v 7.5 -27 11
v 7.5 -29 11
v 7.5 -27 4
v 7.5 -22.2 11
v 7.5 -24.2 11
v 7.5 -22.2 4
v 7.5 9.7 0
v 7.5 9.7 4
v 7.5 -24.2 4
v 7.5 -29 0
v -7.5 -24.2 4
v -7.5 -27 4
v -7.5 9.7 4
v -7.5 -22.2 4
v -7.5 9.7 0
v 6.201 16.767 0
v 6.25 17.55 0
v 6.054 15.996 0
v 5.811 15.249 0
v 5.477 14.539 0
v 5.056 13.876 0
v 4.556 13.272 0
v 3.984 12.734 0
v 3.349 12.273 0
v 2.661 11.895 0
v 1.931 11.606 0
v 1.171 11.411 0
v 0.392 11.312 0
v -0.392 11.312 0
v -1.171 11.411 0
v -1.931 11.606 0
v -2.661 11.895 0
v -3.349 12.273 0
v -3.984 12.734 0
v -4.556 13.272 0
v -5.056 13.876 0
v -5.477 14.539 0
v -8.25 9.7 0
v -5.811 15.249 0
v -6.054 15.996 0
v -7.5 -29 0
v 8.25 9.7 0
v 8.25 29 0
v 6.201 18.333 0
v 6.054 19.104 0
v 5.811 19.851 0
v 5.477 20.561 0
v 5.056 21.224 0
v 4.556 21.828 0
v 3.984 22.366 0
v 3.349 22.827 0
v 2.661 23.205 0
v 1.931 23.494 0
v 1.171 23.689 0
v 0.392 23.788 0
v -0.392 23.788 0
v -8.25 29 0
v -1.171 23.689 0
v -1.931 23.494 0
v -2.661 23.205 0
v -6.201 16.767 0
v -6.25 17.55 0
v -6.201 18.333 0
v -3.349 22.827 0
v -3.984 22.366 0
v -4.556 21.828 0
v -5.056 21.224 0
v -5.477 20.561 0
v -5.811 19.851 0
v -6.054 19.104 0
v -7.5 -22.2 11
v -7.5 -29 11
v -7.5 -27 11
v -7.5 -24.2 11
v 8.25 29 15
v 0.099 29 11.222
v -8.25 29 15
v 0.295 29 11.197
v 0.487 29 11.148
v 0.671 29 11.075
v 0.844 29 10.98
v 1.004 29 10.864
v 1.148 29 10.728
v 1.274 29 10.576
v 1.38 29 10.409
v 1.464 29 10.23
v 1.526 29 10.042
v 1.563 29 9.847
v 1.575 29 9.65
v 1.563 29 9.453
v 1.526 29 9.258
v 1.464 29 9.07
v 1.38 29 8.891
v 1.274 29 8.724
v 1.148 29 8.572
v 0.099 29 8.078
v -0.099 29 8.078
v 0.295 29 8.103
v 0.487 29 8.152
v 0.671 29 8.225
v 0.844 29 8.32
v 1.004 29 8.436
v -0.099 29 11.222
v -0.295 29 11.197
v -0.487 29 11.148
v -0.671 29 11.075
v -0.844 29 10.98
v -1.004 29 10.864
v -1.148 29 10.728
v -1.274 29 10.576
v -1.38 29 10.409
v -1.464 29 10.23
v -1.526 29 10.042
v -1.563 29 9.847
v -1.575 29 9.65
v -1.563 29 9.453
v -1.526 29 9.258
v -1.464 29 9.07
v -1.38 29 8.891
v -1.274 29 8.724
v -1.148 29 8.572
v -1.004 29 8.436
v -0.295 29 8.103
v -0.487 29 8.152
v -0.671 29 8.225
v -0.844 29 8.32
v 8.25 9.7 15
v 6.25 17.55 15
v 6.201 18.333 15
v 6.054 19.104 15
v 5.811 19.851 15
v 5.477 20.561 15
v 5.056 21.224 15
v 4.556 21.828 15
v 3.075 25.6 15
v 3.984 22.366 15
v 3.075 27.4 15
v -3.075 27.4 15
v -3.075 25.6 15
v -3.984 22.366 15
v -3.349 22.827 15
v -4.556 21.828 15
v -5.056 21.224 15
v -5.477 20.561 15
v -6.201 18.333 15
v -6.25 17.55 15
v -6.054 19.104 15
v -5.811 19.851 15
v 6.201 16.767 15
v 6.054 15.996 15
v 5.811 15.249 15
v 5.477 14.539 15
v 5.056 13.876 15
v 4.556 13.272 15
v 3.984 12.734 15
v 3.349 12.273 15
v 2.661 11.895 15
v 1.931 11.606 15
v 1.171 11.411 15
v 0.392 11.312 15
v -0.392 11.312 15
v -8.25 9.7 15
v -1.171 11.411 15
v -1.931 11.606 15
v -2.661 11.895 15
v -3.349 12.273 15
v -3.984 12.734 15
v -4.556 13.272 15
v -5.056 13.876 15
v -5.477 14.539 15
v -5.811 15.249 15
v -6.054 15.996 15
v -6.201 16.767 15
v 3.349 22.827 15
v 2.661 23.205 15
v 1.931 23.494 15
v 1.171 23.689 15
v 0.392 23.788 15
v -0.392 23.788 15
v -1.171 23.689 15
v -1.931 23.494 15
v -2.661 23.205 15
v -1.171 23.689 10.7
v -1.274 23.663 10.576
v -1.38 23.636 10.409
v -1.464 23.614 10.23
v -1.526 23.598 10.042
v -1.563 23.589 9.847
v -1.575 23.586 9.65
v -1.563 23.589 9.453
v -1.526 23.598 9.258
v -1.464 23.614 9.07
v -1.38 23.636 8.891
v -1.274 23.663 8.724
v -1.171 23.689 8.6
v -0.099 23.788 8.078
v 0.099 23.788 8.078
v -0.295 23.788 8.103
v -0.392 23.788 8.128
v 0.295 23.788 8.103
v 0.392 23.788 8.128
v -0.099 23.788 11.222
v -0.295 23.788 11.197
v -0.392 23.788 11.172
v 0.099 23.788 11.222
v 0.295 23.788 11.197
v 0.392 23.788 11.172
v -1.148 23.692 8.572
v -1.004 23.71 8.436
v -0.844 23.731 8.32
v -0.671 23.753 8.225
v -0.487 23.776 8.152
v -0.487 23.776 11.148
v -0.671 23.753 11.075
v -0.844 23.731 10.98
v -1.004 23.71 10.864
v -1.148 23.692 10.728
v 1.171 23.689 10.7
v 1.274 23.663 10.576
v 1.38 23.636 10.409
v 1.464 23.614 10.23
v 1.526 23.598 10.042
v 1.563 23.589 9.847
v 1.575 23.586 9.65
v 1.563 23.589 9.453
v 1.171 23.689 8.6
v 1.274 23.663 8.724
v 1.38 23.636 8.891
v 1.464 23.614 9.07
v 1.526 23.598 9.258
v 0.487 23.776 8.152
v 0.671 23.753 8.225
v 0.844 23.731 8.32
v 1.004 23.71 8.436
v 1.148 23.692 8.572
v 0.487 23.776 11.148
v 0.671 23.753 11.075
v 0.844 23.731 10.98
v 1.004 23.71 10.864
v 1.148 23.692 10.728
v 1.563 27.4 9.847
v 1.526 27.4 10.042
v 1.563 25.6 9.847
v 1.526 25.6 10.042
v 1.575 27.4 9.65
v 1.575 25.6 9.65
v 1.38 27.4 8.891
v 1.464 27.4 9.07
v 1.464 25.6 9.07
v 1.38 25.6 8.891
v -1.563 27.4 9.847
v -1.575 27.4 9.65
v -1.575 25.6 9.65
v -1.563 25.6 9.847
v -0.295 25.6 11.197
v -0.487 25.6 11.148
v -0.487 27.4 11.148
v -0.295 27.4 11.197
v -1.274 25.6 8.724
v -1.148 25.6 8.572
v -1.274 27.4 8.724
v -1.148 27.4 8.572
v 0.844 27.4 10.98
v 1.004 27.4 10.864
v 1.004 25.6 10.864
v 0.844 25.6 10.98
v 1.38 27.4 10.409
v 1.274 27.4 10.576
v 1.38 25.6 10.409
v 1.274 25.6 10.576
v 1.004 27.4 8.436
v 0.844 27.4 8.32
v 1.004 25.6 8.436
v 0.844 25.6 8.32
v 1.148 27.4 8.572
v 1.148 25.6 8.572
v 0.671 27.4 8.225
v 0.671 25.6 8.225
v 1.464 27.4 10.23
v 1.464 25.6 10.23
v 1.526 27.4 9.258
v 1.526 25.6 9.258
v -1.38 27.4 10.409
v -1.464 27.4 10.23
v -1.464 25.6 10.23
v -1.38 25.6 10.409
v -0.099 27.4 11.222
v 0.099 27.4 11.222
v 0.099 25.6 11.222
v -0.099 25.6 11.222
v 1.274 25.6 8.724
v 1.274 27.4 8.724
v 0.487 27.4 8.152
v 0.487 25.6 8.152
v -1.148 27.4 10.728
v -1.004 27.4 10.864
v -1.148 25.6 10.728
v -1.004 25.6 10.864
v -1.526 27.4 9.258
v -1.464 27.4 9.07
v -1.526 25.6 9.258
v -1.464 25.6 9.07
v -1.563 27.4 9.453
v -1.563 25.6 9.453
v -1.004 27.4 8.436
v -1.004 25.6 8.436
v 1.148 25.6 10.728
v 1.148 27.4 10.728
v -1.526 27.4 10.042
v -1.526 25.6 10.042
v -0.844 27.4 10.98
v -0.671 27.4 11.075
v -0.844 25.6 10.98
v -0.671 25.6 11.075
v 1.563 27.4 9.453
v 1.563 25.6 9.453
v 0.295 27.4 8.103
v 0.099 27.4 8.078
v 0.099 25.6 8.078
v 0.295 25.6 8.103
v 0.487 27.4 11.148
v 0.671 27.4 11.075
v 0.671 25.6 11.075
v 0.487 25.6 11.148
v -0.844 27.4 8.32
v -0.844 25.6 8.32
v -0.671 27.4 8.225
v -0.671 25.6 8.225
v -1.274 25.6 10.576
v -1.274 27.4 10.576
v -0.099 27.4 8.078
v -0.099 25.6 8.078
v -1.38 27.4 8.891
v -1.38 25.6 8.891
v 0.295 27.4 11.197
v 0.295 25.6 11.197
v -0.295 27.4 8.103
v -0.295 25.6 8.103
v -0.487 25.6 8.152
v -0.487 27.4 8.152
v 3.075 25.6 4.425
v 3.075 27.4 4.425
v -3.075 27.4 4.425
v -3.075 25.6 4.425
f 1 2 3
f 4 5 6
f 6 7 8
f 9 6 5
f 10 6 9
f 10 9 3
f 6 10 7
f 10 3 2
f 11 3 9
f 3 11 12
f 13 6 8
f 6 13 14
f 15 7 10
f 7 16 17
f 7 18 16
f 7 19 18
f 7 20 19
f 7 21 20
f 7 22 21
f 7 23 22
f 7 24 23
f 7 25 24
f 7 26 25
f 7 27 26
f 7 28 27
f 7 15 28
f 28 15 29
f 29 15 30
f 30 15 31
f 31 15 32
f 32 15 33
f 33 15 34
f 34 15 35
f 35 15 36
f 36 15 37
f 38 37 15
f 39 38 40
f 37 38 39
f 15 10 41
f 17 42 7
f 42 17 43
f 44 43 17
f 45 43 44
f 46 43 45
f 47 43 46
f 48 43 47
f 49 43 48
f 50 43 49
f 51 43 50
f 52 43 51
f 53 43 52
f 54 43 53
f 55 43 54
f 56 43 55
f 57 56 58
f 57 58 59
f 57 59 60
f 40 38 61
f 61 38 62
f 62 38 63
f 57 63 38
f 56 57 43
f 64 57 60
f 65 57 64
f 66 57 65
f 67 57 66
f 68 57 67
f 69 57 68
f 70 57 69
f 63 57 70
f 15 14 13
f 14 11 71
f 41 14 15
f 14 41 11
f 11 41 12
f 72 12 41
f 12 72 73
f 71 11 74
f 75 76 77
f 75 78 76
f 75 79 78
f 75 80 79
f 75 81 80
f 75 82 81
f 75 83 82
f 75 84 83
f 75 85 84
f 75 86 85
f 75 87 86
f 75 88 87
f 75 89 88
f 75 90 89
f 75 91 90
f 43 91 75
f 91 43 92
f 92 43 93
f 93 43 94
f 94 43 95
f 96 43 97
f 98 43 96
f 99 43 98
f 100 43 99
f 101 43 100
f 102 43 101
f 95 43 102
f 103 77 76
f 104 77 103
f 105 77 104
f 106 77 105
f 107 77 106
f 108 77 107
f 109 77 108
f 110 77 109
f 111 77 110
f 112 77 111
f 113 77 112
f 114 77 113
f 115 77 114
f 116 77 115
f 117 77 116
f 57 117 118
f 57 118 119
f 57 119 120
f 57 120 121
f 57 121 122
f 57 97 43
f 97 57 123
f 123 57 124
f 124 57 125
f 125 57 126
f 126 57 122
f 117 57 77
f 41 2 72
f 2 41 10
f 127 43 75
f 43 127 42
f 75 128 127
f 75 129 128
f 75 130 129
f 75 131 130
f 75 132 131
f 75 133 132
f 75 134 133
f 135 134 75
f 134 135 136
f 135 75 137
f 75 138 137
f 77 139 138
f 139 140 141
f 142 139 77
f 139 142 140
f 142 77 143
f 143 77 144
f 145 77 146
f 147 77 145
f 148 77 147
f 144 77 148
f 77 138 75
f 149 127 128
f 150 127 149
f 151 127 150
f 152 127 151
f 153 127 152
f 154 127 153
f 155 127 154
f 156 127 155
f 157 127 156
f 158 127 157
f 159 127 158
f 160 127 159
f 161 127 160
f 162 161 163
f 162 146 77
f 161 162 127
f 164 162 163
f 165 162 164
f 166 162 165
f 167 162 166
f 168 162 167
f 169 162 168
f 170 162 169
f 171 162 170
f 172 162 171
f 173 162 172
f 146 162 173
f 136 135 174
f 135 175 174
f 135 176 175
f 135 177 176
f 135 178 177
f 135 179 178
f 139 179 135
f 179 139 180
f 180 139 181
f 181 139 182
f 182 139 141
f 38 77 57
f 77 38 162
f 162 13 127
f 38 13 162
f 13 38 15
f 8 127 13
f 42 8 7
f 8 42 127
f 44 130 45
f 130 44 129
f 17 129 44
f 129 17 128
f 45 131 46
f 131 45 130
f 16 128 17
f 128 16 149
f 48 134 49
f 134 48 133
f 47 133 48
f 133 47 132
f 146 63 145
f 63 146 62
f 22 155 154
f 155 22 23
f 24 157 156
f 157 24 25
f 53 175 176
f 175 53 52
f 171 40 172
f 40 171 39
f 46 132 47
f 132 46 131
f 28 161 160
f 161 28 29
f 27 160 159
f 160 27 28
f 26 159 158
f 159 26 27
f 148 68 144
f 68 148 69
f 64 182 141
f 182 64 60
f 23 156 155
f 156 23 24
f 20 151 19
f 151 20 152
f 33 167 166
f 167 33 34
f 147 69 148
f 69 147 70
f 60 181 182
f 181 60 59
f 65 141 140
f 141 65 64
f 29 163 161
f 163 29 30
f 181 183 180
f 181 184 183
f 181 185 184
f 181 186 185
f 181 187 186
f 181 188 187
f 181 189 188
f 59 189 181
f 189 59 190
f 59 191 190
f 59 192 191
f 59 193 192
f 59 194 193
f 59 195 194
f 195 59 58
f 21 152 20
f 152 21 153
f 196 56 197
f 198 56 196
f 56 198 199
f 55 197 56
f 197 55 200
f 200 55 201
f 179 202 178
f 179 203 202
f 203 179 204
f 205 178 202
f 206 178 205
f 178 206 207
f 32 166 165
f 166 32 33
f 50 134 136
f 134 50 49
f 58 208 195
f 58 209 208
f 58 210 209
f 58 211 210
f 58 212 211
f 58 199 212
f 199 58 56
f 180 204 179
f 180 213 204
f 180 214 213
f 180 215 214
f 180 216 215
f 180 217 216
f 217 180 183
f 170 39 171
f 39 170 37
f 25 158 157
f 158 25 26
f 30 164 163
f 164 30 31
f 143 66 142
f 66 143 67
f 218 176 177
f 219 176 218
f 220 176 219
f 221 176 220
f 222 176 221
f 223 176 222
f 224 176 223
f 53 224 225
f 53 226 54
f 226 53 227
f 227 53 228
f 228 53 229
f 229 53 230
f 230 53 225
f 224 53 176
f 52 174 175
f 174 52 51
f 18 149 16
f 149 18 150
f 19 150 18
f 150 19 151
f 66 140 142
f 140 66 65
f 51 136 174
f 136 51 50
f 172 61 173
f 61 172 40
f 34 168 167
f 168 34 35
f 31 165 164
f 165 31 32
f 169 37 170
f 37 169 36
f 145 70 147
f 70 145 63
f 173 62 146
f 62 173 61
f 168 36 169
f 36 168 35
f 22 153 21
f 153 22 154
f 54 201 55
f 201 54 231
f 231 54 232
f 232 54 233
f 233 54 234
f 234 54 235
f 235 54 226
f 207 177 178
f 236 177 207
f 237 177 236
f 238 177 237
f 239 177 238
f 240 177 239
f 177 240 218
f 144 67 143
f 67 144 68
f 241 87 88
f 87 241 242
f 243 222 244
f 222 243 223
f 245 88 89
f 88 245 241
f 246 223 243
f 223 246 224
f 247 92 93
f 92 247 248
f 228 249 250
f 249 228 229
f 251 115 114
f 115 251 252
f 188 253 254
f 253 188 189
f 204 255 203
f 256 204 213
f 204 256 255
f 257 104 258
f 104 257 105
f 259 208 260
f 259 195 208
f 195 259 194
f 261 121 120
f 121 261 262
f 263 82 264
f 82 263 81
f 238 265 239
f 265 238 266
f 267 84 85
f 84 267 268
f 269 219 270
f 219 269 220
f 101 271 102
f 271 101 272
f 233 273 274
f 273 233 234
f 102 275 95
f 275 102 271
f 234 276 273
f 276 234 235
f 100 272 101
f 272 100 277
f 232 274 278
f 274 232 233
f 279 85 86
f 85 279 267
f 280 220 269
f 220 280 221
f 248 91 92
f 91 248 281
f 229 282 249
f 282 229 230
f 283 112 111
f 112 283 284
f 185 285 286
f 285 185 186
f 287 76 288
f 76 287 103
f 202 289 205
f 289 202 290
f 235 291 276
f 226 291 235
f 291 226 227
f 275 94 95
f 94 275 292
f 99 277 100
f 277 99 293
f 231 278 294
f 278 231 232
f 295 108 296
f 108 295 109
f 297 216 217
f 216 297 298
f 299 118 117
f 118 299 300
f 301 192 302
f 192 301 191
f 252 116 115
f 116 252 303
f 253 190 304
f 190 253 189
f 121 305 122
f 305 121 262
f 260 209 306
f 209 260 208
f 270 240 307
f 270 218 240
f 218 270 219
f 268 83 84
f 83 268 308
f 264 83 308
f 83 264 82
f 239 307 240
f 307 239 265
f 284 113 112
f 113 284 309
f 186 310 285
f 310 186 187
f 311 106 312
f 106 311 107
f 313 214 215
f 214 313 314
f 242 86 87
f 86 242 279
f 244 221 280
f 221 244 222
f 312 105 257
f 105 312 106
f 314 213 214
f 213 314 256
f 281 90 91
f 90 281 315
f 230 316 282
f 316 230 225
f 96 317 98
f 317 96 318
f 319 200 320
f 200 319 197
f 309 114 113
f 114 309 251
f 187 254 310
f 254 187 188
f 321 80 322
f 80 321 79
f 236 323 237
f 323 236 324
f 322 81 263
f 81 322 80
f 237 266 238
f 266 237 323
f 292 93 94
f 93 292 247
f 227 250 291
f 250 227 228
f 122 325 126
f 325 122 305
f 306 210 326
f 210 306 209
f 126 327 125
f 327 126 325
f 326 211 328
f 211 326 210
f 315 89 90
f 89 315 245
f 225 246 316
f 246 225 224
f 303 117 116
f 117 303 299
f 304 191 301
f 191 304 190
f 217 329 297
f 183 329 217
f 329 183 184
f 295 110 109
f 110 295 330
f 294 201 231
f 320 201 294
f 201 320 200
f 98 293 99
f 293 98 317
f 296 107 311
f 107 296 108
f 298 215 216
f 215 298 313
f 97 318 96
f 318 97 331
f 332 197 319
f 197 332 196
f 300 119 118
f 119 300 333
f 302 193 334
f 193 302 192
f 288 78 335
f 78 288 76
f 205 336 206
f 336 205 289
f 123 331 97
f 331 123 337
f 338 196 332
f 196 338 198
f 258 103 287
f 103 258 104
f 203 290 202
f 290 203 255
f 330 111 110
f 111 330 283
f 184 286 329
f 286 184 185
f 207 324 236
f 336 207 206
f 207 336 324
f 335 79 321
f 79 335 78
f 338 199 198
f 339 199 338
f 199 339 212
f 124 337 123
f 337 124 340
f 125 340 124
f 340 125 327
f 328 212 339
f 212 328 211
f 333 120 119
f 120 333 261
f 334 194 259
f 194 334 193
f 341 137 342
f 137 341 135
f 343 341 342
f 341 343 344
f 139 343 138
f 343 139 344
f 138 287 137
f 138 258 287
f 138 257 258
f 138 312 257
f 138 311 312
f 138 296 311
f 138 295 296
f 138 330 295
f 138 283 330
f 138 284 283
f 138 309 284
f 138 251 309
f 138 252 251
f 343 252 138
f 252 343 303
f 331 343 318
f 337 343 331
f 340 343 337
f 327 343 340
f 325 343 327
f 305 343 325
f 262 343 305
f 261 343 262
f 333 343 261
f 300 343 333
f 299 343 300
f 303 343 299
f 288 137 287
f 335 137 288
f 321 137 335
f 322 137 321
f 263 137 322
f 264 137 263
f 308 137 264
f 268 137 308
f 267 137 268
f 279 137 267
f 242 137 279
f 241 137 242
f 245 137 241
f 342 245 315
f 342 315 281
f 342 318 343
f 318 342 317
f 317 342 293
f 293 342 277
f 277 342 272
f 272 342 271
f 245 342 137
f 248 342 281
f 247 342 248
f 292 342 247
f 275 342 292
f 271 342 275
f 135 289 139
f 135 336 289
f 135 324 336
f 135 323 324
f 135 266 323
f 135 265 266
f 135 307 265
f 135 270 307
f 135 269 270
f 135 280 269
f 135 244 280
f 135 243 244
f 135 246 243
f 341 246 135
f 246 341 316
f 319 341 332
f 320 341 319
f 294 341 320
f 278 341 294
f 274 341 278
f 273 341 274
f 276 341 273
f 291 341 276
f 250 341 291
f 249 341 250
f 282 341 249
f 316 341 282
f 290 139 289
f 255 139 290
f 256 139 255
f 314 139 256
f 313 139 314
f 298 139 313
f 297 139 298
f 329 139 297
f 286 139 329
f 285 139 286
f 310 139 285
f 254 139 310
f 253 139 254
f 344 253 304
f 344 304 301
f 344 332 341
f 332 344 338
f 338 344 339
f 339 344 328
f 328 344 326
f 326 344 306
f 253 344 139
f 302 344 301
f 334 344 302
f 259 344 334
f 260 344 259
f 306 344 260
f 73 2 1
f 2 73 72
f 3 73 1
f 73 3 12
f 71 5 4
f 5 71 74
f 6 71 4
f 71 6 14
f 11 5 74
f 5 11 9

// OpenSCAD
include <MCAD/units.scad>

$fn = 50;

width = 15;
length = 58;
thickness = 4;
groove = 2.8;
wall_height = 7;
wall_thickness = 2;

tolerance = 0.15;

tool_diameter = 11.5;
tool_tolerance = 1;
nut_trap_thickness = 1.8;
tool_holder_padding = 2.5;
tool_holder_length = tool_diameter + tool_tolerance + nut_trap_thickness + tool_holder_padding * 2;
tool_holder_height = 15;
nut_trap_diameter = 6;

difference() {
    union() {
        translate([-width/2, -length/2])
        cube([width, length, thickness]);
        
        translate([-tool_diameter/2-tool_holder_padding, length / 2 - tool_holder_length, 0])
        cube([tool_diameter + 2 * tool_holder_padding, tool_holder_length, tool_holder_height]);
    }
    
    translate([0, length / 2 - nut_trap_thickness - tool_holder_length / 2, -epsilon / 2])
    cylinder(h=tool_holder_height + epsilon, r=(tool_diameter + tool_tolerance) / 2);
    
    translate([0, length / 2 + epsilon, tool_holder_length / 2])
    rotate([90, 0, 0])
    cylinder(r=(M3 + tolerance)/2, h=tool_holder_length / 2);
    
    // nut trap
    translate([-(nut_trap_diameter + tolerance) / 2, length / 2 - nut_trap_thickness - (tool_holder_padding - nut_trap_thickness / 2), tool_holder_height / 2 - (nut_trap_diameter + tolerance) / 2])
    cube([6 + tolerance, nut_trap_thickness, tool_holder_height]);
}

translate([-width/2, -length/2, thickness])
cube([width, wall_thickness, wall_height]);

translate([-width/2, -length/2 + groove + wall_thickness, thickness])
cube([width, wall_thickness, wall_height]);
